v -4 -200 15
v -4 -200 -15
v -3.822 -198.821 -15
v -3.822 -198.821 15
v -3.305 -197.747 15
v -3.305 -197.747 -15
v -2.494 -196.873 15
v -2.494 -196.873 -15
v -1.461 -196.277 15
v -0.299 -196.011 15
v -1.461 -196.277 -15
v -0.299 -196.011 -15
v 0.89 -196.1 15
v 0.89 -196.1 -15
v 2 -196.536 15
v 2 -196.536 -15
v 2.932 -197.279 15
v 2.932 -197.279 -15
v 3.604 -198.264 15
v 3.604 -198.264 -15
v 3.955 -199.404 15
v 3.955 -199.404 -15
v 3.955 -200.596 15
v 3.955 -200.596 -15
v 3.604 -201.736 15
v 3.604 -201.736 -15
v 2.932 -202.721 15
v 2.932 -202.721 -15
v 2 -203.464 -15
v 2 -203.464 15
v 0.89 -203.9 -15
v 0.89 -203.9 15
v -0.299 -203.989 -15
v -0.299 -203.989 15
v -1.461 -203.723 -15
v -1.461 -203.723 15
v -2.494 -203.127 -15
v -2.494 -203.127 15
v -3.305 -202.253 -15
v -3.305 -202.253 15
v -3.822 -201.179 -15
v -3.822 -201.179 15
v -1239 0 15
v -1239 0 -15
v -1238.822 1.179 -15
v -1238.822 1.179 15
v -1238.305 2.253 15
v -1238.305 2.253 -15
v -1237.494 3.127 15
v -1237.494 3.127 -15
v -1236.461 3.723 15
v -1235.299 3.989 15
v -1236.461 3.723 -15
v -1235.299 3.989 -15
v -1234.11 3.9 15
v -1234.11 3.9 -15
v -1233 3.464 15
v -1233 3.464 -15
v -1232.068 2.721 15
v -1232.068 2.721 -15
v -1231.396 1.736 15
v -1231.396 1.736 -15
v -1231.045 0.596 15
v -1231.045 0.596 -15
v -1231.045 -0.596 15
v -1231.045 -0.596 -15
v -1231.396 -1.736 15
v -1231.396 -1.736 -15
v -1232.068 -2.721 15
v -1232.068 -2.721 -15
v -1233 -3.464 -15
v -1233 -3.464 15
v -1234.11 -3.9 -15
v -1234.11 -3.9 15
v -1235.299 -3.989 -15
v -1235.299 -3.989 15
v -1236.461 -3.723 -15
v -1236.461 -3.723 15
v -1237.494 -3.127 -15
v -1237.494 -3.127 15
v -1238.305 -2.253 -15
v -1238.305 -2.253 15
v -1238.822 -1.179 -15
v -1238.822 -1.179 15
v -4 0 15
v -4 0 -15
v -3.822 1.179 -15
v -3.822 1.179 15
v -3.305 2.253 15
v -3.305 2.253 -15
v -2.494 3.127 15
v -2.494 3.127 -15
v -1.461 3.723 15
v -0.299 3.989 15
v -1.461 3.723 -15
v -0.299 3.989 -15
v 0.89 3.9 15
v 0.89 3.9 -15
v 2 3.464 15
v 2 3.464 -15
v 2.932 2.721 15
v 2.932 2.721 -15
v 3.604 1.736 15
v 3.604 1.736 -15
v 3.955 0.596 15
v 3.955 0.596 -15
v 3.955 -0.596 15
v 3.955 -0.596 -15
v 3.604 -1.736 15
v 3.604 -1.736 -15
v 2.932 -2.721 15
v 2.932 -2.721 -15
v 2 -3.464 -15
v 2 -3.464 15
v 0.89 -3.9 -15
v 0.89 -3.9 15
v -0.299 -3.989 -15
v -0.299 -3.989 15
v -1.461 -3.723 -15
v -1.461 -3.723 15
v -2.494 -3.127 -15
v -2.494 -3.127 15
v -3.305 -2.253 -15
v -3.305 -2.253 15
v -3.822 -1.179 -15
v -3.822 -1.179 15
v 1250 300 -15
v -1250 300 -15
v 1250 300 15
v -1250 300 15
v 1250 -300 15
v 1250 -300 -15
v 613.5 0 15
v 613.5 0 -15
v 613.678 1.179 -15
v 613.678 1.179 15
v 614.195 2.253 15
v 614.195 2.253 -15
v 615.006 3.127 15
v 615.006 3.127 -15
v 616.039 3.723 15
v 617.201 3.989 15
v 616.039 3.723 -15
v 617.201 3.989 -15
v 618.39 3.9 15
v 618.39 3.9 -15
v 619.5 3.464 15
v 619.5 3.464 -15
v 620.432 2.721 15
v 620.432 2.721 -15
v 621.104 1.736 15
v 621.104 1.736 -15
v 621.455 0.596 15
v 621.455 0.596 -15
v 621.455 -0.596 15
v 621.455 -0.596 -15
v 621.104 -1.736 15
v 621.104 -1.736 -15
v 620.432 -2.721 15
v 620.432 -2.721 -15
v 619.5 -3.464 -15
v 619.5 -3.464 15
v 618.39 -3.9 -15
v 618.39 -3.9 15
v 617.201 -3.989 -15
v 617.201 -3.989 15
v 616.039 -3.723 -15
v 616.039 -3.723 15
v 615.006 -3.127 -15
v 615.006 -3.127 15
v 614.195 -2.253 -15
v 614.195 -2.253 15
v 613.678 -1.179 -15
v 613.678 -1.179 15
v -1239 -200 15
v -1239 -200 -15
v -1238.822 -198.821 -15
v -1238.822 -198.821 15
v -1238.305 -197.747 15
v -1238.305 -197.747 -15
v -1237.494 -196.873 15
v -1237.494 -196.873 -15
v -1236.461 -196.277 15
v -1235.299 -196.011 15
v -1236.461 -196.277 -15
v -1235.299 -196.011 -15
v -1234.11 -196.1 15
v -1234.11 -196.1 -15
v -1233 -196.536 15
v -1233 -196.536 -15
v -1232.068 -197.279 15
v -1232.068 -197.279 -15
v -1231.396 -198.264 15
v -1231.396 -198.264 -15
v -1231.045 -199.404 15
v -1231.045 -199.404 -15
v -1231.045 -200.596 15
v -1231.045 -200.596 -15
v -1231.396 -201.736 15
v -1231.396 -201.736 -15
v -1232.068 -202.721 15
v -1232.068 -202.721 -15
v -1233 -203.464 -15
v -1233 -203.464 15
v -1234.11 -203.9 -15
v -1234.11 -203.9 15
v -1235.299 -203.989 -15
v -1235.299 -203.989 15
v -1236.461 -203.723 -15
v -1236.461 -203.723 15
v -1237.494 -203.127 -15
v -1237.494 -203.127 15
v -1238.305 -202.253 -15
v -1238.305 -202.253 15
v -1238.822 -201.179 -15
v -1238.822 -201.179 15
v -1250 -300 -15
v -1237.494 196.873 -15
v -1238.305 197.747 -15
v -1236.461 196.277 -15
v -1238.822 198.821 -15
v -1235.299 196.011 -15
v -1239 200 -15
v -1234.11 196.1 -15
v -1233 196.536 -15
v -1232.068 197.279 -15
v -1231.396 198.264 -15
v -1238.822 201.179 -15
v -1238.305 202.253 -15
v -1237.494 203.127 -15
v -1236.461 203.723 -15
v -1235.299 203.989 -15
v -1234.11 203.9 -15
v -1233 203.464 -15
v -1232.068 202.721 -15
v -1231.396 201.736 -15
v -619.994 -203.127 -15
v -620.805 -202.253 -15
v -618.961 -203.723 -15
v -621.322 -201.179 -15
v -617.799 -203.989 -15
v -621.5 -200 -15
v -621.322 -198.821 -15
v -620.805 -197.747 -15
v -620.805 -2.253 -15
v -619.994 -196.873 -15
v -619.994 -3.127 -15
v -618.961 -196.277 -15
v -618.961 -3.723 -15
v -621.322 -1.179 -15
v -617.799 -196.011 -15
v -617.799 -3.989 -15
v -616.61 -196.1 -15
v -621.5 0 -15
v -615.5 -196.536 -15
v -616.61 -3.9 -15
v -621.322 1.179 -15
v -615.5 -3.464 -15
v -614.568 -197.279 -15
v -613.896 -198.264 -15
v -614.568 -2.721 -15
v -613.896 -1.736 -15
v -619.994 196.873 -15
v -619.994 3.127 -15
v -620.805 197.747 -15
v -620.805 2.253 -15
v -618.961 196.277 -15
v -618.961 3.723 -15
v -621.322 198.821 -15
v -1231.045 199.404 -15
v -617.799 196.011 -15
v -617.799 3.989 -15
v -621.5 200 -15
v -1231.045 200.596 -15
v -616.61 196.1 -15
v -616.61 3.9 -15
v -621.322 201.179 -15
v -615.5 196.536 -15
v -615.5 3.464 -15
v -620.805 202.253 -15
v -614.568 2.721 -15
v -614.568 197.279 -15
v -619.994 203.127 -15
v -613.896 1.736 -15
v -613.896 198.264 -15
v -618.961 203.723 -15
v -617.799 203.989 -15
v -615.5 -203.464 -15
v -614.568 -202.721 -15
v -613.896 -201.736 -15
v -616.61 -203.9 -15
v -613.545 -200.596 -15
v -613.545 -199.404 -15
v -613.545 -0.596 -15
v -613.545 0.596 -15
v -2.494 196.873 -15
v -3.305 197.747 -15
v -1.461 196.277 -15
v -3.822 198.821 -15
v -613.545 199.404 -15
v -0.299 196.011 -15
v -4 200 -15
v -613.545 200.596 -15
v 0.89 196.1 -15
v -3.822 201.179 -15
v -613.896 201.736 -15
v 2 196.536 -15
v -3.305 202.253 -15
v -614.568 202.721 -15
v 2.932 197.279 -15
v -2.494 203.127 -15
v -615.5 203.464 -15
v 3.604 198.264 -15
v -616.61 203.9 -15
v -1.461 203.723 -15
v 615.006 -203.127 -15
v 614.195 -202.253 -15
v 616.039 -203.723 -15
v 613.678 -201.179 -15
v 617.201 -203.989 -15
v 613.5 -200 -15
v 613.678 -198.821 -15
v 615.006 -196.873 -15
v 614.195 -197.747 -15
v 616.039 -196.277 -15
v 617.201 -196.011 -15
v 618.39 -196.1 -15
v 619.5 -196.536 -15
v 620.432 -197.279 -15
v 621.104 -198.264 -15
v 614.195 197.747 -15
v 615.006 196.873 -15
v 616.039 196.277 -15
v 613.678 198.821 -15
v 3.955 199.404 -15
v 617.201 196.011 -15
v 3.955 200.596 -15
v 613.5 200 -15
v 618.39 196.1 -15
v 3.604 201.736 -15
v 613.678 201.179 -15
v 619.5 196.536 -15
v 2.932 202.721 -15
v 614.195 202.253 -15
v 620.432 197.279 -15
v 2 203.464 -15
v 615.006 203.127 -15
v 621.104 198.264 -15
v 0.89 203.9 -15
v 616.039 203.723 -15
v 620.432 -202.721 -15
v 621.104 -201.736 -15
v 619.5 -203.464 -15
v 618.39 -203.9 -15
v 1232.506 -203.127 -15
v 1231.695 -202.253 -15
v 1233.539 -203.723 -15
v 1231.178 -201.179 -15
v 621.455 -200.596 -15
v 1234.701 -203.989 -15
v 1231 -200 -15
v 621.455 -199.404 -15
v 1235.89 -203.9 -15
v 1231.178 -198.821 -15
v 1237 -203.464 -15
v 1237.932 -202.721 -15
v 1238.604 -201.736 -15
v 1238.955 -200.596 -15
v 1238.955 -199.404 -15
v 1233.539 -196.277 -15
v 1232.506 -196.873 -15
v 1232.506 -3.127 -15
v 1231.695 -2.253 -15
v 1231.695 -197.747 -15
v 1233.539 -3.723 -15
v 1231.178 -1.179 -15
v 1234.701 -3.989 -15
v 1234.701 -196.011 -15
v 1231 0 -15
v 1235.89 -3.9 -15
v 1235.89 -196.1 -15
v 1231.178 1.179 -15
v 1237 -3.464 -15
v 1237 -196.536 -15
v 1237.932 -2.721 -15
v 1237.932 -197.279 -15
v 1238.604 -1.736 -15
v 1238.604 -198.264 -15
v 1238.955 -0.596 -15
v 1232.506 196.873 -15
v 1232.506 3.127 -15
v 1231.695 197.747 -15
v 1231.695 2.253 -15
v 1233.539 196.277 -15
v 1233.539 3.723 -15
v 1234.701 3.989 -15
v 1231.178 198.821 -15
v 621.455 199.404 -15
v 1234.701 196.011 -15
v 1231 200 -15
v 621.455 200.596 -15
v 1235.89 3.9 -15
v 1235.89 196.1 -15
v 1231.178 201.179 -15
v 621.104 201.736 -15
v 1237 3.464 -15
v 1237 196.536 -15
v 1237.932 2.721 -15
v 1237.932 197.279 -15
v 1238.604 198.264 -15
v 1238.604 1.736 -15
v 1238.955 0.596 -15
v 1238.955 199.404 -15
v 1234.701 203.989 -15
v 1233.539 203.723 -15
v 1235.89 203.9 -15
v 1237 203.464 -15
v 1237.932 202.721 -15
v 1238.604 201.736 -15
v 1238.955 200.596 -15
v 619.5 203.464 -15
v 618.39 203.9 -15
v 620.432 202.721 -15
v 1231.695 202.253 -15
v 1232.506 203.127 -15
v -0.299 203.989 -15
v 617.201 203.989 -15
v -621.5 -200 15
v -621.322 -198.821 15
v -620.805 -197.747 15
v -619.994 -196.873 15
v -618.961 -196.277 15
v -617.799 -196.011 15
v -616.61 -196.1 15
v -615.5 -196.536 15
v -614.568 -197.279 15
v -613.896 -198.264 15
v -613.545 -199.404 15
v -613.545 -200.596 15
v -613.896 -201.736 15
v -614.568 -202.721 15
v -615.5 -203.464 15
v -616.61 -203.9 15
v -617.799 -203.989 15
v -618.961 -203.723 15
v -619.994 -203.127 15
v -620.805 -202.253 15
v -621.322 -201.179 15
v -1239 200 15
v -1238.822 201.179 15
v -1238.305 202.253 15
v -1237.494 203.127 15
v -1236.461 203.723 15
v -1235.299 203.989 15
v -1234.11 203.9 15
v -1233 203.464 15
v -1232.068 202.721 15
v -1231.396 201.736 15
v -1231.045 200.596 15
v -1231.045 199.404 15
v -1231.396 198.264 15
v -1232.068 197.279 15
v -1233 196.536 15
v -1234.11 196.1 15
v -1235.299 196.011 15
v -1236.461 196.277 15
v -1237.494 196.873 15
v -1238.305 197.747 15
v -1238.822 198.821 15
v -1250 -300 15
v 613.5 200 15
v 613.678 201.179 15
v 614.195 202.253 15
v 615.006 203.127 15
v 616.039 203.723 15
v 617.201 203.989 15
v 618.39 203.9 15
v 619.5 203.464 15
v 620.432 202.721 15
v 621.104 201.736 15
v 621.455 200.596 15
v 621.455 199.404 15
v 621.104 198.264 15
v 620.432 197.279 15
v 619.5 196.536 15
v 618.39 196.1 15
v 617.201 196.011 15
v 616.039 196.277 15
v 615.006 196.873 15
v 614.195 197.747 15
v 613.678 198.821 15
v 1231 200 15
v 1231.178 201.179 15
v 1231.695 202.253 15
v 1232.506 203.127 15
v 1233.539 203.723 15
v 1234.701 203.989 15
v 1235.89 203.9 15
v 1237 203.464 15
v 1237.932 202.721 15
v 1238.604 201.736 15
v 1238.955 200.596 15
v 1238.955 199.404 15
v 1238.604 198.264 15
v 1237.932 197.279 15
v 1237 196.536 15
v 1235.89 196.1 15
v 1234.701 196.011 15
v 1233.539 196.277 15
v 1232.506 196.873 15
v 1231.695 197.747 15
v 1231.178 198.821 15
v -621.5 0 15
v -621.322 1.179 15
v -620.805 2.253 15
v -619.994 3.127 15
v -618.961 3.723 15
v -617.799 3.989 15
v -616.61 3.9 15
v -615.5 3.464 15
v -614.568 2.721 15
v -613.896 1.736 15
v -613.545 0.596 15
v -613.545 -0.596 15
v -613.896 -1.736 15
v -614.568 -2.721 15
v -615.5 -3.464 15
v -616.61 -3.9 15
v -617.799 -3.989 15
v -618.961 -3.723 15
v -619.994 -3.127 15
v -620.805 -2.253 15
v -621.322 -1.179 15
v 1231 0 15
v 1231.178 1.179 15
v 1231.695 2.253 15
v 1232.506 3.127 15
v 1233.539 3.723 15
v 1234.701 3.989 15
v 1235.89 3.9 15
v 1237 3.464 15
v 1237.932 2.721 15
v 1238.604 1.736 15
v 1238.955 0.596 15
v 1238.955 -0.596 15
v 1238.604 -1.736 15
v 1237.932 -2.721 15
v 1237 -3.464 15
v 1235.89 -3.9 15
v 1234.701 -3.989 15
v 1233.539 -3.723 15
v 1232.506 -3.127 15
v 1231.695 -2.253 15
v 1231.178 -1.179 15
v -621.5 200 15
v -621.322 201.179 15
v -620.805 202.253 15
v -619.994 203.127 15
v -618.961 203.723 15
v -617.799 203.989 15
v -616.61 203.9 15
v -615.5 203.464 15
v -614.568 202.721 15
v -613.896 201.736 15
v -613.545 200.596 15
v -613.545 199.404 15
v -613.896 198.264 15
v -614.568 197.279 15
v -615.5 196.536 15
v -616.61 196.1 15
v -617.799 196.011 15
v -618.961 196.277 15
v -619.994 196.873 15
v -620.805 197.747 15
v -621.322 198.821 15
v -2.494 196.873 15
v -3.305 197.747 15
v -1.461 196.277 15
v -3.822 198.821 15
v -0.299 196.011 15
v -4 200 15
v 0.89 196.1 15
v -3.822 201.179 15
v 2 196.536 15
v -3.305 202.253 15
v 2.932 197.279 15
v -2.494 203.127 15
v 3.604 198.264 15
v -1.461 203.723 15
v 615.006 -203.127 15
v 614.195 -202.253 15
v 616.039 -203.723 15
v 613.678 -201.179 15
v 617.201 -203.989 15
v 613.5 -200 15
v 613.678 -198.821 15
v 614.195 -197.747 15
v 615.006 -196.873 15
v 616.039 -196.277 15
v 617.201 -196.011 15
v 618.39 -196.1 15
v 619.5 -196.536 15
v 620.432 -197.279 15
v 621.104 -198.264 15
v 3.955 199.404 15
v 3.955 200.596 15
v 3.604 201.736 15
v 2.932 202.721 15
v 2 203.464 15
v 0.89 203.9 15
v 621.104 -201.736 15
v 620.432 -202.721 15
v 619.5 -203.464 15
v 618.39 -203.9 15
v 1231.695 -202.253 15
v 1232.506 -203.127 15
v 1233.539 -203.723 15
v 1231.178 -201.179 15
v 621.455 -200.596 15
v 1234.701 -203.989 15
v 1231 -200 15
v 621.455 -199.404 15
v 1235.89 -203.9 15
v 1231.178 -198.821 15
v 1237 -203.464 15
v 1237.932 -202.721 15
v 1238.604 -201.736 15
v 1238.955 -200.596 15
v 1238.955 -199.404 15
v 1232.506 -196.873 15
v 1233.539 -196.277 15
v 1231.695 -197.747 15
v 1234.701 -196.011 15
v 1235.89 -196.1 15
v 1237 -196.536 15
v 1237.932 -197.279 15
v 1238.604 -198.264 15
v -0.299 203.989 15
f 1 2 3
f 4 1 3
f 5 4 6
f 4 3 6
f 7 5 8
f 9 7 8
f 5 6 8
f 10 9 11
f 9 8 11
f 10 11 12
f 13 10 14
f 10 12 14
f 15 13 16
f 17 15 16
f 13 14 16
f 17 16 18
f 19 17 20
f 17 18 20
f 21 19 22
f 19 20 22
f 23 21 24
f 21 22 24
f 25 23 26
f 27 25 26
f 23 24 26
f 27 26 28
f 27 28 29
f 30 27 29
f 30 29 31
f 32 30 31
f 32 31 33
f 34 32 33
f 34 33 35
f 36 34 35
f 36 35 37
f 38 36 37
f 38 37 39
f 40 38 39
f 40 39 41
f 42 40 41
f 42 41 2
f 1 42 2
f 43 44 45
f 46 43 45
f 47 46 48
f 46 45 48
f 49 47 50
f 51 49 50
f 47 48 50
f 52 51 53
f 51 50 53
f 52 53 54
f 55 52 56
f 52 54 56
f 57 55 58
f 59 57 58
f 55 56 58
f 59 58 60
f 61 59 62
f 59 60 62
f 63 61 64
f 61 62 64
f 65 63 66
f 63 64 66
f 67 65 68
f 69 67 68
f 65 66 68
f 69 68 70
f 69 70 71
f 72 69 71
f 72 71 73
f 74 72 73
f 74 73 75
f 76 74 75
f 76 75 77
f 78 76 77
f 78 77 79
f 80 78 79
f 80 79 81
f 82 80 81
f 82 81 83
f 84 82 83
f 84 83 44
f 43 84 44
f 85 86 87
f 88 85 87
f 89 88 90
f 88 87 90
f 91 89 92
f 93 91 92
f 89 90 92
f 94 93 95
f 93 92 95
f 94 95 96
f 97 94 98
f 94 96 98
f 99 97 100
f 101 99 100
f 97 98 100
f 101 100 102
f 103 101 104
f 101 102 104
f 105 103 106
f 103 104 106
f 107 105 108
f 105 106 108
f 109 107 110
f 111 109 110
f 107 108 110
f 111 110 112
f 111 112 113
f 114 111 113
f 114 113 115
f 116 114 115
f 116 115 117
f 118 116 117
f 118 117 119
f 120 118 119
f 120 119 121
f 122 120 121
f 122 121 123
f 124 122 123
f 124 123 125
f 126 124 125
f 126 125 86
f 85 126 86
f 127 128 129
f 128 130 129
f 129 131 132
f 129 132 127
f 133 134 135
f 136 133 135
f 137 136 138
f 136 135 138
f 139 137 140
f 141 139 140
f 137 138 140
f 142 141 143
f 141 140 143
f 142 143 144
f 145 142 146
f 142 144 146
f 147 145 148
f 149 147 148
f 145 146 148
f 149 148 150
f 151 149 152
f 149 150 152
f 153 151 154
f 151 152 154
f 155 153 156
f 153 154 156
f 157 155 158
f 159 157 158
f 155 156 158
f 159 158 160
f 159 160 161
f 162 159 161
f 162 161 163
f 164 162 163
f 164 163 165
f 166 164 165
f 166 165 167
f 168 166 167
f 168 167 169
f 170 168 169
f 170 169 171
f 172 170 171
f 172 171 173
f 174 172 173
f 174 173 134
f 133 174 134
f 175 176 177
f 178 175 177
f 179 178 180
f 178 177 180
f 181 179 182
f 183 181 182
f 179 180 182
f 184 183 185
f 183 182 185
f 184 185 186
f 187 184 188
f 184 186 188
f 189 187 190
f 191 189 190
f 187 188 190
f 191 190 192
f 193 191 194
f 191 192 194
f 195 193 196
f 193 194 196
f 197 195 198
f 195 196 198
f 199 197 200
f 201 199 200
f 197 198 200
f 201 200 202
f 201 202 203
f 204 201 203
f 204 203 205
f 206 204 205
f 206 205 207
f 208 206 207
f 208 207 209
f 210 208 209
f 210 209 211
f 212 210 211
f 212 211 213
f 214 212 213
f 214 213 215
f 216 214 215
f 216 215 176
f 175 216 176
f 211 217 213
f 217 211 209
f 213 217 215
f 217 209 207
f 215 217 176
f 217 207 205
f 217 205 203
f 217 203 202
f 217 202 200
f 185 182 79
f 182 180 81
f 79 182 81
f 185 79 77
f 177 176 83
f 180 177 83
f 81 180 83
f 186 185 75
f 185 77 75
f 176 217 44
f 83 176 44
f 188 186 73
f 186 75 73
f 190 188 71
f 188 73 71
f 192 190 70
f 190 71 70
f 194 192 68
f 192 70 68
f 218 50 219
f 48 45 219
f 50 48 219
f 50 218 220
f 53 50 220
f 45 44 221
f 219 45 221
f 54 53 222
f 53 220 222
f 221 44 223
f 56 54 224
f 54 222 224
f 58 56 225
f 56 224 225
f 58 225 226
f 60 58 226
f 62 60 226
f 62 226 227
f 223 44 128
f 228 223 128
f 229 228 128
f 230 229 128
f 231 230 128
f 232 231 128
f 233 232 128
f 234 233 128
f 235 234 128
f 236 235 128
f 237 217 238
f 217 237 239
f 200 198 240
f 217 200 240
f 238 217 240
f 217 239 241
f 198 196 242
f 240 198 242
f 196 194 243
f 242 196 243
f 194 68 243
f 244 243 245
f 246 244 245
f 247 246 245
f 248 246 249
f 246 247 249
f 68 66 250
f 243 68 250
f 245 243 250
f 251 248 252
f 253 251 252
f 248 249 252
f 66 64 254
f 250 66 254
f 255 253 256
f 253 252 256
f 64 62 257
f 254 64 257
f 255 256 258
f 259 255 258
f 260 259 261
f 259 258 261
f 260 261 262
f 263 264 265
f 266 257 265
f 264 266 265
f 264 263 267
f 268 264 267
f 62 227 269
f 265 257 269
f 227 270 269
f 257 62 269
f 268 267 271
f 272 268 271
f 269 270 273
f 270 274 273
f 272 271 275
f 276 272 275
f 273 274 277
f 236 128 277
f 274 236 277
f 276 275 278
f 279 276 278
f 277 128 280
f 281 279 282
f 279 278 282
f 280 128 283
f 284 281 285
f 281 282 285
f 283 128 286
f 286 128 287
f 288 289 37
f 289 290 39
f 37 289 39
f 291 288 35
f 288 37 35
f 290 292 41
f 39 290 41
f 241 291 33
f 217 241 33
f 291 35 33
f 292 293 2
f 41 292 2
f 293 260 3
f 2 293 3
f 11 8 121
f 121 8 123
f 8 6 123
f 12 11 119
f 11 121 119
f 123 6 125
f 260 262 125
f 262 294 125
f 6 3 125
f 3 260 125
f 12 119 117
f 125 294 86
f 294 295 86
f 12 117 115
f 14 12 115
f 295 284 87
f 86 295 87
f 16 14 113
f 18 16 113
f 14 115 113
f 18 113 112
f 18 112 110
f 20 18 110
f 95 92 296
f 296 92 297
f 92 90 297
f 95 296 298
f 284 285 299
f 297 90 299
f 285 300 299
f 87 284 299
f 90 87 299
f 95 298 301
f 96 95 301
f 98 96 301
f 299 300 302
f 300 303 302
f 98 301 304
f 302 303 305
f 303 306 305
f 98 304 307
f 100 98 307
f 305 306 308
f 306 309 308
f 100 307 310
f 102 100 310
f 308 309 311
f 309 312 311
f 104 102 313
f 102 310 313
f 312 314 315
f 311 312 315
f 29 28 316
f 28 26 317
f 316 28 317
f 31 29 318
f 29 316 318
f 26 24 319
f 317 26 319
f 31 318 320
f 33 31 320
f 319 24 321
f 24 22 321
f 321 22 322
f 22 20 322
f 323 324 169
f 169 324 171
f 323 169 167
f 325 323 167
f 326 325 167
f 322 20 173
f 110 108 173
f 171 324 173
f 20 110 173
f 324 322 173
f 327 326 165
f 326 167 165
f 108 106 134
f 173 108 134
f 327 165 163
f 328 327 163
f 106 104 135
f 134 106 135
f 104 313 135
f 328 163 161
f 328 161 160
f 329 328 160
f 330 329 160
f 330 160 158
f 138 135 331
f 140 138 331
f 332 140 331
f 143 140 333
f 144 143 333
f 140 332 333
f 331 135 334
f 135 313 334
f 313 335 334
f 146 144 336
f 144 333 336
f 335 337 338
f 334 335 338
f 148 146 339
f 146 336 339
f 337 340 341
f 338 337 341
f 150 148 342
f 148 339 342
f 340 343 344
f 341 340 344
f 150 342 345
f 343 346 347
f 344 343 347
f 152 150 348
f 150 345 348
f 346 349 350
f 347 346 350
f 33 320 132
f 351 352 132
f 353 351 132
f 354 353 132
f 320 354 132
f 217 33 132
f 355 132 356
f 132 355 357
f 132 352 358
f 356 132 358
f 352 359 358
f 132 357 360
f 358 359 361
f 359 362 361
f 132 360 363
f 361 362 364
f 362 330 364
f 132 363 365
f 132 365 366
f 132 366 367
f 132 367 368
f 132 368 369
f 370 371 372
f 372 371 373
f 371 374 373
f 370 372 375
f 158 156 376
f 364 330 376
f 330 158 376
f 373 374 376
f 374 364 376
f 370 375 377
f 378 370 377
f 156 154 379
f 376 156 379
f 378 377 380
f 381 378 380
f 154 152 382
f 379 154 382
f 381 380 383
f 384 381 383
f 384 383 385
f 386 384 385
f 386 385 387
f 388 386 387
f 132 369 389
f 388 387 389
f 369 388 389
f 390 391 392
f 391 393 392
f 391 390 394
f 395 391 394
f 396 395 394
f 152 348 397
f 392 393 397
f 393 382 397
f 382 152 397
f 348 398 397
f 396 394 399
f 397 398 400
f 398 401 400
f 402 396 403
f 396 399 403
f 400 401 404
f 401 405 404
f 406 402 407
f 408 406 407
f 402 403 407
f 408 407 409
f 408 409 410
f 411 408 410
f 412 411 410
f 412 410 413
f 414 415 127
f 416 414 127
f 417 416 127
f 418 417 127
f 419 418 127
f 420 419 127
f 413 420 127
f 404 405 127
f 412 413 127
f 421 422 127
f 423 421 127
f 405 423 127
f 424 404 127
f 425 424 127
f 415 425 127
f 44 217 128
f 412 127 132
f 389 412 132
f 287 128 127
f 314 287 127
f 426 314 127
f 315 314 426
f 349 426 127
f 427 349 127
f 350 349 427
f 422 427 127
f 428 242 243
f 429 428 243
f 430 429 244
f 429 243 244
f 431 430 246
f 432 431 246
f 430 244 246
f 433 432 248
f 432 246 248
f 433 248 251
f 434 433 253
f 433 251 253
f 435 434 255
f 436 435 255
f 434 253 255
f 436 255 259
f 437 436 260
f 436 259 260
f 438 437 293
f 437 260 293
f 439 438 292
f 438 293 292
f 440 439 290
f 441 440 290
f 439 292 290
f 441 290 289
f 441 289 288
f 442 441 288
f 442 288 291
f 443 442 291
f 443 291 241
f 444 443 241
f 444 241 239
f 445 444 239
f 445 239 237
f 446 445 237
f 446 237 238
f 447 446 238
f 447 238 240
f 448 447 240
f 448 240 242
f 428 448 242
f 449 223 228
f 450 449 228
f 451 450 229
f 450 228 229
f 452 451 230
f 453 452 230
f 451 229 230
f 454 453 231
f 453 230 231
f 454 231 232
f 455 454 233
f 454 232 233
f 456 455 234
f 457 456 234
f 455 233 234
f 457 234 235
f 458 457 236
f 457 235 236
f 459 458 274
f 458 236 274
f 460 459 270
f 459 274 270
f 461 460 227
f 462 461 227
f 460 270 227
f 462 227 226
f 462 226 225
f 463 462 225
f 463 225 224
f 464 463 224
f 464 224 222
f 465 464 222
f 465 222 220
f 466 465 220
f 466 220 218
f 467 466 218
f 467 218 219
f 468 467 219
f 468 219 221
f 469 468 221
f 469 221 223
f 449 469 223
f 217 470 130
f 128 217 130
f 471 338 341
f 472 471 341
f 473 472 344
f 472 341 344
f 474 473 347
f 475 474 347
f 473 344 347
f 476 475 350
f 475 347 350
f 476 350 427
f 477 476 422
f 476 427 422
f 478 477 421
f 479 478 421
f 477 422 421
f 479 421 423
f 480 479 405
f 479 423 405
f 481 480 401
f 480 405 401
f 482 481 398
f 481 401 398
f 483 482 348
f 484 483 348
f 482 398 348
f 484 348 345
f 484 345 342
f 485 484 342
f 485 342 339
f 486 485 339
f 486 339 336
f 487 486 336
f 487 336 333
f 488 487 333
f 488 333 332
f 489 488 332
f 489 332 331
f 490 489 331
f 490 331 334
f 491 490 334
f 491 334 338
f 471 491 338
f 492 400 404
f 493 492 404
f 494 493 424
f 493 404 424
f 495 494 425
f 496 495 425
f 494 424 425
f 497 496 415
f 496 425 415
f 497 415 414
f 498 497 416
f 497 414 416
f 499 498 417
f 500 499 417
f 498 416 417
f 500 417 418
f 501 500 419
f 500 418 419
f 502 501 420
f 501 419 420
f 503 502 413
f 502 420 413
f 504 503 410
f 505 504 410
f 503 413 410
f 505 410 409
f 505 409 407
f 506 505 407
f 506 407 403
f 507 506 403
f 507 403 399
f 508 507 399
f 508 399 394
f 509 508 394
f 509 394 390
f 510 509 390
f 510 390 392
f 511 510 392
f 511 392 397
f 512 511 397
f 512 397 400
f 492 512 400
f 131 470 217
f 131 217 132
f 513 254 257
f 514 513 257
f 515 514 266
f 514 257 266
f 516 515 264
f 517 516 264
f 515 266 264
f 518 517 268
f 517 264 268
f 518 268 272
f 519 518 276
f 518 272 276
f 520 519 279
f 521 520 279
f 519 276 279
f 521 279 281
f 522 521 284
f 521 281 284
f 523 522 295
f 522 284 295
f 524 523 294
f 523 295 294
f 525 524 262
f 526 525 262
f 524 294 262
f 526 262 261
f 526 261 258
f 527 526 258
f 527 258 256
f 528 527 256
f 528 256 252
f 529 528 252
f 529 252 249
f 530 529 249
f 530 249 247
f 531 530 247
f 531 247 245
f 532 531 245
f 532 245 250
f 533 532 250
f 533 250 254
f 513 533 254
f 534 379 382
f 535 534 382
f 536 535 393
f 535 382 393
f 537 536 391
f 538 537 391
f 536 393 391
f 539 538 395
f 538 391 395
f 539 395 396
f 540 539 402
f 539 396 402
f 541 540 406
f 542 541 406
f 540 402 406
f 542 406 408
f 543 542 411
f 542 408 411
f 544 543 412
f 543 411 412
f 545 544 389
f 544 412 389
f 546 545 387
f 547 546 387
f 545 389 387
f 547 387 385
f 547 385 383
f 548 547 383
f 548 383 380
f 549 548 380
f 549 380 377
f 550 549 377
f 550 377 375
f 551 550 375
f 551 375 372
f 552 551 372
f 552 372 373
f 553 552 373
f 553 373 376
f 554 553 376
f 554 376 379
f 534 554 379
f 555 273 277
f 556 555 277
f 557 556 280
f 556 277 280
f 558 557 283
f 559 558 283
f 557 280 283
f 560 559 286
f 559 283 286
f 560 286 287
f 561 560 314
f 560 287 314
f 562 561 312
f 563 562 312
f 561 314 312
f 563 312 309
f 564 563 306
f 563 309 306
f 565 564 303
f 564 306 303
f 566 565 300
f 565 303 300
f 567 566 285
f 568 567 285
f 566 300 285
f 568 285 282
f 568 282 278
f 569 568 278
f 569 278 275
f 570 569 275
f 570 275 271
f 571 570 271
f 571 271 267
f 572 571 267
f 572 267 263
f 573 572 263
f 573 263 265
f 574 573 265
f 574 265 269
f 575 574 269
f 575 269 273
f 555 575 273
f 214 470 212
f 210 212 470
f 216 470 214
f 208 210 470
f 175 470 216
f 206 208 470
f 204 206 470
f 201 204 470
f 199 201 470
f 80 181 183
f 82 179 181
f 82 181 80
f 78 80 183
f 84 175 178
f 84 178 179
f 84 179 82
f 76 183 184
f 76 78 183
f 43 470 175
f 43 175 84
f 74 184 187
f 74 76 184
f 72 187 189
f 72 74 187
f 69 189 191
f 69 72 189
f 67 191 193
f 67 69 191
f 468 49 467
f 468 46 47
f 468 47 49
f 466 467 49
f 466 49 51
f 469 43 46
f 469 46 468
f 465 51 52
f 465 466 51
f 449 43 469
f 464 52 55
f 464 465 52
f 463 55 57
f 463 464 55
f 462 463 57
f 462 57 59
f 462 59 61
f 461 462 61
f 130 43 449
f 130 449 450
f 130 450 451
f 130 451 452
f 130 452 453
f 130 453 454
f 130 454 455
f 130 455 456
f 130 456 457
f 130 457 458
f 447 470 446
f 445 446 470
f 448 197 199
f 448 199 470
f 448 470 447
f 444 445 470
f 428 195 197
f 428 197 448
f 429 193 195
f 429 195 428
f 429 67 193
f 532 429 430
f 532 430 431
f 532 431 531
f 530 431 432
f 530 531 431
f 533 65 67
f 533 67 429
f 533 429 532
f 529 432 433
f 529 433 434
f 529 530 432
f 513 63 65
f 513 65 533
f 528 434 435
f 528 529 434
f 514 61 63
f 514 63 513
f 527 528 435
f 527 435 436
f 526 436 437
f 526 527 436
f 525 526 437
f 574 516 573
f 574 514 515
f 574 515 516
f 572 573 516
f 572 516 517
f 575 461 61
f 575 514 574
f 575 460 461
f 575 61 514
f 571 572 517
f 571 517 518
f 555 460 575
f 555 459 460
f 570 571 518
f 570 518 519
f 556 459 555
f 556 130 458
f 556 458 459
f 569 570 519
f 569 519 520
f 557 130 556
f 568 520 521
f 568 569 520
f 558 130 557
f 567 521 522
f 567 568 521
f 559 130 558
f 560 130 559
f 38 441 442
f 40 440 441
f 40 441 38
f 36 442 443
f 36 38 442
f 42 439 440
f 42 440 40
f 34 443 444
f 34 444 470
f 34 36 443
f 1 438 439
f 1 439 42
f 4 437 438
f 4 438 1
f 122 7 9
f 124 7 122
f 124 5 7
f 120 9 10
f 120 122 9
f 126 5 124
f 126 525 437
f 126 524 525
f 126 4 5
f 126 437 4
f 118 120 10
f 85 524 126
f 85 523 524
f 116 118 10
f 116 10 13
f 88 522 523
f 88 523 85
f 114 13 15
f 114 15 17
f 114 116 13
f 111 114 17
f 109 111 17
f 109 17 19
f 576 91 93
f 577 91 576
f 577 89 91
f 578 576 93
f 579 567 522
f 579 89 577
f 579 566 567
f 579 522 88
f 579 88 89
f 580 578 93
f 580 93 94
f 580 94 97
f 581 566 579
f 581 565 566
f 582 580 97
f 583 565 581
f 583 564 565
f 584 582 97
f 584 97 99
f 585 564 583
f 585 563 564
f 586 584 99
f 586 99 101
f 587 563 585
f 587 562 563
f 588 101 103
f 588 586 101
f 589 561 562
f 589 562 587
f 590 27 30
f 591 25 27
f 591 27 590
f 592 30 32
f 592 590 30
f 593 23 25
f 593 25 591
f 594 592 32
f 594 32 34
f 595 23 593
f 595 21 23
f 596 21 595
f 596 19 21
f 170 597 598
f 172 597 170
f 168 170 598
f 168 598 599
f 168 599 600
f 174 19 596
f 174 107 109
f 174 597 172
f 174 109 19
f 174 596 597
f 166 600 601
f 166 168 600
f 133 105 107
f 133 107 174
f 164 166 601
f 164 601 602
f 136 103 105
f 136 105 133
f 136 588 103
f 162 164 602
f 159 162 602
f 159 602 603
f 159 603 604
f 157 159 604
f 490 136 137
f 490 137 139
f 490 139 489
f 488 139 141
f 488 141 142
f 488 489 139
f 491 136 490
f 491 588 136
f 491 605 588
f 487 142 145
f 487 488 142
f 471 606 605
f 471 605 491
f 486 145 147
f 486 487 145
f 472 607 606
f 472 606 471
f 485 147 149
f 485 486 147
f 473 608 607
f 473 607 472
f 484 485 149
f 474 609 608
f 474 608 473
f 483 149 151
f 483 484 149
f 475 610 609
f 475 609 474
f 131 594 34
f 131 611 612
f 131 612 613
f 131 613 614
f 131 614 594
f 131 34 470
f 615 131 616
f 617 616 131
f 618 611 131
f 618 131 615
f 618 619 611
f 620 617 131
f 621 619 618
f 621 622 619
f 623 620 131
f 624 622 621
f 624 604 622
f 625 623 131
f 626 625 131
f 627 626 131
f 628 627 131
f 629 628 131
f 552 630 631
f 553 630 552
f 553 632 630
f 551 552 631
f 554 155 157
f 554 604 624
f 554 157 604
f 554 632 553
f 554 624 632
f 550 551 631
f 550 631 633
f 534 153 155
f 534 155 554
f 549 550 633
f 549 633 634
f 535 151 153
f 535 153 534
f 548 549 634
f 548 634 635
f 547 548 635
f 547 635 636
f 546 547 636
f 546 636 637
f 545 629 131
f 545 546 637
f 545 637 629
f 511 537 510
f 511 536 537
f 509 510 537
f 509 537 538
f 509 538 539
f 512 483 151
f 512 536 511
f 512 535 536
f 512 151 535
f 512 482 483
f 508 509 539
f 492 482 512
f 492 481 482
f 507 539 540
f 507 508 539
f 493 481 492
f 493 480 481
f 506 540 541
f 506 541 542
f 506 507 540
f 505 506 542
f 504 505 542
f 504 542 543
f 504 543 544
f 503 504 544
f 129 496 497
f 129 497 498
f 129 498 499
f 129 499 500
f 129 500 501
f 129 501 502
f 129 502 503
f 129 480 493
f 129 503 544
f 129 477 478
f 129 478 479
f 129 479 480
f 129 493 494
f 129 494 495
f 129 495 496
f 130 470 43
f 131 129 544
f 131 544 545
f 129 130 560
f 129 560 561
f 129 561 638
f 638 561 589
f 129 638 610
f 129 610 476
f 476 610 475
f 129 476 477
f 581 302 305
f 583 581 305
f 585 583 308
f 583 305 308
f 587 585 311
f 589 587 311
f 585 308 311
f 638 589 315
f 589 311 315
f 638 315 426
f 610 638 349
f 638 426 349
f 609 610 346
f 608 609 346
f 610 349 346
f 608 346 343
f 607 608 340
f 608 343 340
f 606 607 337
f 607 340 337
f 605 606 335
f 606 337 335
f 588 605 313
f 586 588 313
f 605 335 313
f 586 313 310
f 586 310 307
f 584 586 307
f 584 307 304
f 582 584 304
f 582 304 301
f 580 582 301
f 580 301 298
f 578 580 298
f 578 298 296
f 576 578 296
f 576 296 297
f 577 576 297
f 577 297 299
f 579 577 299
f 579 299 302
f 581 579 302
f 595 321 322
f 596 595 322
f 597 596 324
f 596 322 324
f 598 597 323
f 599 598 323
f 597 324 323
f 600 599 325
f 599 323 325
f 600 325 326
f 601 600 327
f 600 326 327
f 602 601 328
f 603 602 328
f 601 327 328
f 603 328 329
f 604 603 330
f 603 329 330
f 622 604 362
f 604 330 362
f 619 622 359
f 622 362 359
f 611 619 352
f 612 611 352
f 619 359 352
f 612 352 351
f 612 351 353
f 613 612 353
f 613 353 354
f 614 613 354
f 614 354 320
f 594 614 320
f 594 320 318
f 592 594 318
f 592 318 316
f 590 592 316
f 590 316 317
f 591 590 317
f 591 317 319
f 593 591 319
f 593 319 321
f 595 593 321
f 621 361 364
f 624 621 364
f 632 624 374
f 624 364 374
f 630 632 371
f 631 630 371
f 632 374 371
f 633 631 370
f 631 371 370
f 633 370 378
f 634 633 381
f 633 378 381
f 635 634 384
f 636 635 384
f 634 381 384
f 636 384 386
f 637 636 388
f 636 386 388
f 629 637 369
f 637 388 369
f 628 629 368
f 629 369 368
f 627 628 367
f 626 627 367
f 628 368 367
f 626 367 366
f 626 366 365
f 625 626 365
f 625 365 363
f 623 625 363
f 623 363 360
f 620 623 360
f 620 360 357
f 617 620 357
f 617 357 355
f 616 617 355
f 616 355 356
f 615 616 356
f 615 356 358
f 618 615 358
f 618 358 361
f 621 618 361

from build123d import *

# Parameters (mm, degrees)
F0_W     = 2500
F0_H     = 600
F1_DEPTH = 15
F3_D     = 8
F3_DEPTH = 30


with BuildPart() as f1:
    # F0 (on Top) → F1 (new body, symmetric)
    with BuildSketch(Plane.XY):
        Rectangle(F0_W, F0_H)
    extrude(amount=F1_DEPTH, both=True)

    # F3
    with Locations(Plane.XY.offset(15)):
        with Locations((-1235, 200), (-1235, 0), (-1235, -200), (-617.5, 200), (-617.5, 0), (-617.5, -200), (0, 200), (0, 0), (0, -200), (617.5, 200), (617.5, 0), (1235, 200), (1235, 0), (1235, -200), (617.5, -200)):
            Hole(F3_D / 2, depth=F3_DEPTH)


solid = f1.part
